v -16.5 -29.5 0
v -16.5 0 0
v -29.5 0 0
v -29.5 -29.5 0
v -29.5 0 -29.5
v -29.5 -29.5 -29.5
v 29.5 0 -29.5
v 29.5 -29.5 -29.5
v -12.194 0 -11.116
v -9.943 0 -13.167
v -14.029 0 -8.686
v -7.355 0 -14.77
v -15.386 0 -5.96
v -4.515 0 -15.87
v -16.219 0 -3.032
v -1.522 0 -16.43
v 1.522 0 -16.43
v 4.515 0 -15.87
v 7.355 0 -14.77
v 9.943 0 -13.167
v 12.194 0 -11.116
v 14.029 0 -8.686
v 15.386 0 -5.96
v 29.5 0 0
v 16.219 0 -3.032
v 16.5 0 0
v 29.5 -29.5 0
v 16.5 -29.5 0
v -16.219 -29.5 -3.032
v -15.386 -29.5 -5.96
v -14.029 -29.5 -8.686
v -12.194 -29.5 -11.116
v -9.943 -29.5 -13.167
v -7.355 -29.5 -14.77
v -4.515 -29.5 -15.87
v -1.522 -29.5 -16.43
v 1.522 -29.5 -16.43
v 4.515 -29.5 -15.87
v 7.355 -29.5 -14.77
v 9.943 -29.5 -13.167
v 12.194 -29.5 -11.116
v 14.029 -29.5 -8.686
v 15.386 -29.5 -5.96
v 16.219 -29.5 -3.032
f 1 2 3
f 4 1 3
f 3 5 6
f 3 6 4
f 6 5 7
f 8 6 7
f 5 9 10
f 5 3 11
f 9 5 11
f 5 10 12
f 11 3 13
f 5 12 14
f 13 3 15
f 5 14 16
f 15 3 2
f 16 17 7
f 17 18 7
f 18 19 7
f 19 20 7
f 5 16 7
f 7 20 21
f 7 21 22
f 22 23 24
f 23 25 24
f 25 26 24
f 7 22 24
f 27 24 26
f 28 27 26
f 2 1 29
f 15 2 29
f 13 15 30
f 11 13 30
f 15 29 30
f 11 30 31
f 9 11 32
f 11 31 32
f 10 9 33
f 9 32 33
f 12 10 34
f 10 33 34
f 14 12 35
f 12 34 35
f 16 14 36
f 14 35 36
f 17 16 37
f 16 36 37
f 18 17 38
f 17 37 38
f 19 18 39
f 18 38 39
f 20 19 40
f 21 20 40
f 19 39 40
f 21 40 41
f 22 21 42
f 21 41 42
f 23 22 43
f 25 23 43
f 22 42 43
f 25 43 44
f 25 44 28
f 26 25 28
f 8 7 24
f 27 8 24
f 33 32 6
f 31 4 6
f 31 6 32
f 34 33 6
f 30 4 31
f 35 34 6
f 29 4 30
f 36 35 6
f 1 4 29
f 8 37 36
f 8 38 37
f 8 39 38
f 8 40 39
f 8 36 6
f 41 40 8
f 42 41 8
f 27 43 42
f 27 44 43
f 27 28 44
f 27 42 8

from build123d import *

# Parameters (mm, degrees)
F0_W     = 59
F0_H     = 59
F1_DEPTH = 29.5
F2_R     = 16.5
F3_DEPTH = 29.501
F4_W     = 59
F4_H     = 29.5
F5_DEPTH = 29.501


with BuildPart() as f1:
    # F0 (on Front) → F1 (new body)
    with BuildSketch(Plane.XZ):
        Rectangle(F0_W, F0_H)
    extrude(amount=F1_DEPTH)

    # F2 (on face) → F3 (cut, through all)
    with BuildSketch(Plane.XZ.offset(29.5)):
        Circle(F2_R)
    extrude(amount=-F3_DEPTH, mode=Mode.SUBTRACT)

    # F4 (on face) → F5 (cut, through all)
    with BuildSketch(Plane(origin=(0, 0, 0), x_dir=(-1, 0, 0), z_dir=(0, 1, 0))):
        with Locations((0, 14.75)):
            Rectangle(F4_W, F4_H)
    extrude(amount=-F5_DEPTH, mode=Mode.SUBTRACT)


solid = f1.part
